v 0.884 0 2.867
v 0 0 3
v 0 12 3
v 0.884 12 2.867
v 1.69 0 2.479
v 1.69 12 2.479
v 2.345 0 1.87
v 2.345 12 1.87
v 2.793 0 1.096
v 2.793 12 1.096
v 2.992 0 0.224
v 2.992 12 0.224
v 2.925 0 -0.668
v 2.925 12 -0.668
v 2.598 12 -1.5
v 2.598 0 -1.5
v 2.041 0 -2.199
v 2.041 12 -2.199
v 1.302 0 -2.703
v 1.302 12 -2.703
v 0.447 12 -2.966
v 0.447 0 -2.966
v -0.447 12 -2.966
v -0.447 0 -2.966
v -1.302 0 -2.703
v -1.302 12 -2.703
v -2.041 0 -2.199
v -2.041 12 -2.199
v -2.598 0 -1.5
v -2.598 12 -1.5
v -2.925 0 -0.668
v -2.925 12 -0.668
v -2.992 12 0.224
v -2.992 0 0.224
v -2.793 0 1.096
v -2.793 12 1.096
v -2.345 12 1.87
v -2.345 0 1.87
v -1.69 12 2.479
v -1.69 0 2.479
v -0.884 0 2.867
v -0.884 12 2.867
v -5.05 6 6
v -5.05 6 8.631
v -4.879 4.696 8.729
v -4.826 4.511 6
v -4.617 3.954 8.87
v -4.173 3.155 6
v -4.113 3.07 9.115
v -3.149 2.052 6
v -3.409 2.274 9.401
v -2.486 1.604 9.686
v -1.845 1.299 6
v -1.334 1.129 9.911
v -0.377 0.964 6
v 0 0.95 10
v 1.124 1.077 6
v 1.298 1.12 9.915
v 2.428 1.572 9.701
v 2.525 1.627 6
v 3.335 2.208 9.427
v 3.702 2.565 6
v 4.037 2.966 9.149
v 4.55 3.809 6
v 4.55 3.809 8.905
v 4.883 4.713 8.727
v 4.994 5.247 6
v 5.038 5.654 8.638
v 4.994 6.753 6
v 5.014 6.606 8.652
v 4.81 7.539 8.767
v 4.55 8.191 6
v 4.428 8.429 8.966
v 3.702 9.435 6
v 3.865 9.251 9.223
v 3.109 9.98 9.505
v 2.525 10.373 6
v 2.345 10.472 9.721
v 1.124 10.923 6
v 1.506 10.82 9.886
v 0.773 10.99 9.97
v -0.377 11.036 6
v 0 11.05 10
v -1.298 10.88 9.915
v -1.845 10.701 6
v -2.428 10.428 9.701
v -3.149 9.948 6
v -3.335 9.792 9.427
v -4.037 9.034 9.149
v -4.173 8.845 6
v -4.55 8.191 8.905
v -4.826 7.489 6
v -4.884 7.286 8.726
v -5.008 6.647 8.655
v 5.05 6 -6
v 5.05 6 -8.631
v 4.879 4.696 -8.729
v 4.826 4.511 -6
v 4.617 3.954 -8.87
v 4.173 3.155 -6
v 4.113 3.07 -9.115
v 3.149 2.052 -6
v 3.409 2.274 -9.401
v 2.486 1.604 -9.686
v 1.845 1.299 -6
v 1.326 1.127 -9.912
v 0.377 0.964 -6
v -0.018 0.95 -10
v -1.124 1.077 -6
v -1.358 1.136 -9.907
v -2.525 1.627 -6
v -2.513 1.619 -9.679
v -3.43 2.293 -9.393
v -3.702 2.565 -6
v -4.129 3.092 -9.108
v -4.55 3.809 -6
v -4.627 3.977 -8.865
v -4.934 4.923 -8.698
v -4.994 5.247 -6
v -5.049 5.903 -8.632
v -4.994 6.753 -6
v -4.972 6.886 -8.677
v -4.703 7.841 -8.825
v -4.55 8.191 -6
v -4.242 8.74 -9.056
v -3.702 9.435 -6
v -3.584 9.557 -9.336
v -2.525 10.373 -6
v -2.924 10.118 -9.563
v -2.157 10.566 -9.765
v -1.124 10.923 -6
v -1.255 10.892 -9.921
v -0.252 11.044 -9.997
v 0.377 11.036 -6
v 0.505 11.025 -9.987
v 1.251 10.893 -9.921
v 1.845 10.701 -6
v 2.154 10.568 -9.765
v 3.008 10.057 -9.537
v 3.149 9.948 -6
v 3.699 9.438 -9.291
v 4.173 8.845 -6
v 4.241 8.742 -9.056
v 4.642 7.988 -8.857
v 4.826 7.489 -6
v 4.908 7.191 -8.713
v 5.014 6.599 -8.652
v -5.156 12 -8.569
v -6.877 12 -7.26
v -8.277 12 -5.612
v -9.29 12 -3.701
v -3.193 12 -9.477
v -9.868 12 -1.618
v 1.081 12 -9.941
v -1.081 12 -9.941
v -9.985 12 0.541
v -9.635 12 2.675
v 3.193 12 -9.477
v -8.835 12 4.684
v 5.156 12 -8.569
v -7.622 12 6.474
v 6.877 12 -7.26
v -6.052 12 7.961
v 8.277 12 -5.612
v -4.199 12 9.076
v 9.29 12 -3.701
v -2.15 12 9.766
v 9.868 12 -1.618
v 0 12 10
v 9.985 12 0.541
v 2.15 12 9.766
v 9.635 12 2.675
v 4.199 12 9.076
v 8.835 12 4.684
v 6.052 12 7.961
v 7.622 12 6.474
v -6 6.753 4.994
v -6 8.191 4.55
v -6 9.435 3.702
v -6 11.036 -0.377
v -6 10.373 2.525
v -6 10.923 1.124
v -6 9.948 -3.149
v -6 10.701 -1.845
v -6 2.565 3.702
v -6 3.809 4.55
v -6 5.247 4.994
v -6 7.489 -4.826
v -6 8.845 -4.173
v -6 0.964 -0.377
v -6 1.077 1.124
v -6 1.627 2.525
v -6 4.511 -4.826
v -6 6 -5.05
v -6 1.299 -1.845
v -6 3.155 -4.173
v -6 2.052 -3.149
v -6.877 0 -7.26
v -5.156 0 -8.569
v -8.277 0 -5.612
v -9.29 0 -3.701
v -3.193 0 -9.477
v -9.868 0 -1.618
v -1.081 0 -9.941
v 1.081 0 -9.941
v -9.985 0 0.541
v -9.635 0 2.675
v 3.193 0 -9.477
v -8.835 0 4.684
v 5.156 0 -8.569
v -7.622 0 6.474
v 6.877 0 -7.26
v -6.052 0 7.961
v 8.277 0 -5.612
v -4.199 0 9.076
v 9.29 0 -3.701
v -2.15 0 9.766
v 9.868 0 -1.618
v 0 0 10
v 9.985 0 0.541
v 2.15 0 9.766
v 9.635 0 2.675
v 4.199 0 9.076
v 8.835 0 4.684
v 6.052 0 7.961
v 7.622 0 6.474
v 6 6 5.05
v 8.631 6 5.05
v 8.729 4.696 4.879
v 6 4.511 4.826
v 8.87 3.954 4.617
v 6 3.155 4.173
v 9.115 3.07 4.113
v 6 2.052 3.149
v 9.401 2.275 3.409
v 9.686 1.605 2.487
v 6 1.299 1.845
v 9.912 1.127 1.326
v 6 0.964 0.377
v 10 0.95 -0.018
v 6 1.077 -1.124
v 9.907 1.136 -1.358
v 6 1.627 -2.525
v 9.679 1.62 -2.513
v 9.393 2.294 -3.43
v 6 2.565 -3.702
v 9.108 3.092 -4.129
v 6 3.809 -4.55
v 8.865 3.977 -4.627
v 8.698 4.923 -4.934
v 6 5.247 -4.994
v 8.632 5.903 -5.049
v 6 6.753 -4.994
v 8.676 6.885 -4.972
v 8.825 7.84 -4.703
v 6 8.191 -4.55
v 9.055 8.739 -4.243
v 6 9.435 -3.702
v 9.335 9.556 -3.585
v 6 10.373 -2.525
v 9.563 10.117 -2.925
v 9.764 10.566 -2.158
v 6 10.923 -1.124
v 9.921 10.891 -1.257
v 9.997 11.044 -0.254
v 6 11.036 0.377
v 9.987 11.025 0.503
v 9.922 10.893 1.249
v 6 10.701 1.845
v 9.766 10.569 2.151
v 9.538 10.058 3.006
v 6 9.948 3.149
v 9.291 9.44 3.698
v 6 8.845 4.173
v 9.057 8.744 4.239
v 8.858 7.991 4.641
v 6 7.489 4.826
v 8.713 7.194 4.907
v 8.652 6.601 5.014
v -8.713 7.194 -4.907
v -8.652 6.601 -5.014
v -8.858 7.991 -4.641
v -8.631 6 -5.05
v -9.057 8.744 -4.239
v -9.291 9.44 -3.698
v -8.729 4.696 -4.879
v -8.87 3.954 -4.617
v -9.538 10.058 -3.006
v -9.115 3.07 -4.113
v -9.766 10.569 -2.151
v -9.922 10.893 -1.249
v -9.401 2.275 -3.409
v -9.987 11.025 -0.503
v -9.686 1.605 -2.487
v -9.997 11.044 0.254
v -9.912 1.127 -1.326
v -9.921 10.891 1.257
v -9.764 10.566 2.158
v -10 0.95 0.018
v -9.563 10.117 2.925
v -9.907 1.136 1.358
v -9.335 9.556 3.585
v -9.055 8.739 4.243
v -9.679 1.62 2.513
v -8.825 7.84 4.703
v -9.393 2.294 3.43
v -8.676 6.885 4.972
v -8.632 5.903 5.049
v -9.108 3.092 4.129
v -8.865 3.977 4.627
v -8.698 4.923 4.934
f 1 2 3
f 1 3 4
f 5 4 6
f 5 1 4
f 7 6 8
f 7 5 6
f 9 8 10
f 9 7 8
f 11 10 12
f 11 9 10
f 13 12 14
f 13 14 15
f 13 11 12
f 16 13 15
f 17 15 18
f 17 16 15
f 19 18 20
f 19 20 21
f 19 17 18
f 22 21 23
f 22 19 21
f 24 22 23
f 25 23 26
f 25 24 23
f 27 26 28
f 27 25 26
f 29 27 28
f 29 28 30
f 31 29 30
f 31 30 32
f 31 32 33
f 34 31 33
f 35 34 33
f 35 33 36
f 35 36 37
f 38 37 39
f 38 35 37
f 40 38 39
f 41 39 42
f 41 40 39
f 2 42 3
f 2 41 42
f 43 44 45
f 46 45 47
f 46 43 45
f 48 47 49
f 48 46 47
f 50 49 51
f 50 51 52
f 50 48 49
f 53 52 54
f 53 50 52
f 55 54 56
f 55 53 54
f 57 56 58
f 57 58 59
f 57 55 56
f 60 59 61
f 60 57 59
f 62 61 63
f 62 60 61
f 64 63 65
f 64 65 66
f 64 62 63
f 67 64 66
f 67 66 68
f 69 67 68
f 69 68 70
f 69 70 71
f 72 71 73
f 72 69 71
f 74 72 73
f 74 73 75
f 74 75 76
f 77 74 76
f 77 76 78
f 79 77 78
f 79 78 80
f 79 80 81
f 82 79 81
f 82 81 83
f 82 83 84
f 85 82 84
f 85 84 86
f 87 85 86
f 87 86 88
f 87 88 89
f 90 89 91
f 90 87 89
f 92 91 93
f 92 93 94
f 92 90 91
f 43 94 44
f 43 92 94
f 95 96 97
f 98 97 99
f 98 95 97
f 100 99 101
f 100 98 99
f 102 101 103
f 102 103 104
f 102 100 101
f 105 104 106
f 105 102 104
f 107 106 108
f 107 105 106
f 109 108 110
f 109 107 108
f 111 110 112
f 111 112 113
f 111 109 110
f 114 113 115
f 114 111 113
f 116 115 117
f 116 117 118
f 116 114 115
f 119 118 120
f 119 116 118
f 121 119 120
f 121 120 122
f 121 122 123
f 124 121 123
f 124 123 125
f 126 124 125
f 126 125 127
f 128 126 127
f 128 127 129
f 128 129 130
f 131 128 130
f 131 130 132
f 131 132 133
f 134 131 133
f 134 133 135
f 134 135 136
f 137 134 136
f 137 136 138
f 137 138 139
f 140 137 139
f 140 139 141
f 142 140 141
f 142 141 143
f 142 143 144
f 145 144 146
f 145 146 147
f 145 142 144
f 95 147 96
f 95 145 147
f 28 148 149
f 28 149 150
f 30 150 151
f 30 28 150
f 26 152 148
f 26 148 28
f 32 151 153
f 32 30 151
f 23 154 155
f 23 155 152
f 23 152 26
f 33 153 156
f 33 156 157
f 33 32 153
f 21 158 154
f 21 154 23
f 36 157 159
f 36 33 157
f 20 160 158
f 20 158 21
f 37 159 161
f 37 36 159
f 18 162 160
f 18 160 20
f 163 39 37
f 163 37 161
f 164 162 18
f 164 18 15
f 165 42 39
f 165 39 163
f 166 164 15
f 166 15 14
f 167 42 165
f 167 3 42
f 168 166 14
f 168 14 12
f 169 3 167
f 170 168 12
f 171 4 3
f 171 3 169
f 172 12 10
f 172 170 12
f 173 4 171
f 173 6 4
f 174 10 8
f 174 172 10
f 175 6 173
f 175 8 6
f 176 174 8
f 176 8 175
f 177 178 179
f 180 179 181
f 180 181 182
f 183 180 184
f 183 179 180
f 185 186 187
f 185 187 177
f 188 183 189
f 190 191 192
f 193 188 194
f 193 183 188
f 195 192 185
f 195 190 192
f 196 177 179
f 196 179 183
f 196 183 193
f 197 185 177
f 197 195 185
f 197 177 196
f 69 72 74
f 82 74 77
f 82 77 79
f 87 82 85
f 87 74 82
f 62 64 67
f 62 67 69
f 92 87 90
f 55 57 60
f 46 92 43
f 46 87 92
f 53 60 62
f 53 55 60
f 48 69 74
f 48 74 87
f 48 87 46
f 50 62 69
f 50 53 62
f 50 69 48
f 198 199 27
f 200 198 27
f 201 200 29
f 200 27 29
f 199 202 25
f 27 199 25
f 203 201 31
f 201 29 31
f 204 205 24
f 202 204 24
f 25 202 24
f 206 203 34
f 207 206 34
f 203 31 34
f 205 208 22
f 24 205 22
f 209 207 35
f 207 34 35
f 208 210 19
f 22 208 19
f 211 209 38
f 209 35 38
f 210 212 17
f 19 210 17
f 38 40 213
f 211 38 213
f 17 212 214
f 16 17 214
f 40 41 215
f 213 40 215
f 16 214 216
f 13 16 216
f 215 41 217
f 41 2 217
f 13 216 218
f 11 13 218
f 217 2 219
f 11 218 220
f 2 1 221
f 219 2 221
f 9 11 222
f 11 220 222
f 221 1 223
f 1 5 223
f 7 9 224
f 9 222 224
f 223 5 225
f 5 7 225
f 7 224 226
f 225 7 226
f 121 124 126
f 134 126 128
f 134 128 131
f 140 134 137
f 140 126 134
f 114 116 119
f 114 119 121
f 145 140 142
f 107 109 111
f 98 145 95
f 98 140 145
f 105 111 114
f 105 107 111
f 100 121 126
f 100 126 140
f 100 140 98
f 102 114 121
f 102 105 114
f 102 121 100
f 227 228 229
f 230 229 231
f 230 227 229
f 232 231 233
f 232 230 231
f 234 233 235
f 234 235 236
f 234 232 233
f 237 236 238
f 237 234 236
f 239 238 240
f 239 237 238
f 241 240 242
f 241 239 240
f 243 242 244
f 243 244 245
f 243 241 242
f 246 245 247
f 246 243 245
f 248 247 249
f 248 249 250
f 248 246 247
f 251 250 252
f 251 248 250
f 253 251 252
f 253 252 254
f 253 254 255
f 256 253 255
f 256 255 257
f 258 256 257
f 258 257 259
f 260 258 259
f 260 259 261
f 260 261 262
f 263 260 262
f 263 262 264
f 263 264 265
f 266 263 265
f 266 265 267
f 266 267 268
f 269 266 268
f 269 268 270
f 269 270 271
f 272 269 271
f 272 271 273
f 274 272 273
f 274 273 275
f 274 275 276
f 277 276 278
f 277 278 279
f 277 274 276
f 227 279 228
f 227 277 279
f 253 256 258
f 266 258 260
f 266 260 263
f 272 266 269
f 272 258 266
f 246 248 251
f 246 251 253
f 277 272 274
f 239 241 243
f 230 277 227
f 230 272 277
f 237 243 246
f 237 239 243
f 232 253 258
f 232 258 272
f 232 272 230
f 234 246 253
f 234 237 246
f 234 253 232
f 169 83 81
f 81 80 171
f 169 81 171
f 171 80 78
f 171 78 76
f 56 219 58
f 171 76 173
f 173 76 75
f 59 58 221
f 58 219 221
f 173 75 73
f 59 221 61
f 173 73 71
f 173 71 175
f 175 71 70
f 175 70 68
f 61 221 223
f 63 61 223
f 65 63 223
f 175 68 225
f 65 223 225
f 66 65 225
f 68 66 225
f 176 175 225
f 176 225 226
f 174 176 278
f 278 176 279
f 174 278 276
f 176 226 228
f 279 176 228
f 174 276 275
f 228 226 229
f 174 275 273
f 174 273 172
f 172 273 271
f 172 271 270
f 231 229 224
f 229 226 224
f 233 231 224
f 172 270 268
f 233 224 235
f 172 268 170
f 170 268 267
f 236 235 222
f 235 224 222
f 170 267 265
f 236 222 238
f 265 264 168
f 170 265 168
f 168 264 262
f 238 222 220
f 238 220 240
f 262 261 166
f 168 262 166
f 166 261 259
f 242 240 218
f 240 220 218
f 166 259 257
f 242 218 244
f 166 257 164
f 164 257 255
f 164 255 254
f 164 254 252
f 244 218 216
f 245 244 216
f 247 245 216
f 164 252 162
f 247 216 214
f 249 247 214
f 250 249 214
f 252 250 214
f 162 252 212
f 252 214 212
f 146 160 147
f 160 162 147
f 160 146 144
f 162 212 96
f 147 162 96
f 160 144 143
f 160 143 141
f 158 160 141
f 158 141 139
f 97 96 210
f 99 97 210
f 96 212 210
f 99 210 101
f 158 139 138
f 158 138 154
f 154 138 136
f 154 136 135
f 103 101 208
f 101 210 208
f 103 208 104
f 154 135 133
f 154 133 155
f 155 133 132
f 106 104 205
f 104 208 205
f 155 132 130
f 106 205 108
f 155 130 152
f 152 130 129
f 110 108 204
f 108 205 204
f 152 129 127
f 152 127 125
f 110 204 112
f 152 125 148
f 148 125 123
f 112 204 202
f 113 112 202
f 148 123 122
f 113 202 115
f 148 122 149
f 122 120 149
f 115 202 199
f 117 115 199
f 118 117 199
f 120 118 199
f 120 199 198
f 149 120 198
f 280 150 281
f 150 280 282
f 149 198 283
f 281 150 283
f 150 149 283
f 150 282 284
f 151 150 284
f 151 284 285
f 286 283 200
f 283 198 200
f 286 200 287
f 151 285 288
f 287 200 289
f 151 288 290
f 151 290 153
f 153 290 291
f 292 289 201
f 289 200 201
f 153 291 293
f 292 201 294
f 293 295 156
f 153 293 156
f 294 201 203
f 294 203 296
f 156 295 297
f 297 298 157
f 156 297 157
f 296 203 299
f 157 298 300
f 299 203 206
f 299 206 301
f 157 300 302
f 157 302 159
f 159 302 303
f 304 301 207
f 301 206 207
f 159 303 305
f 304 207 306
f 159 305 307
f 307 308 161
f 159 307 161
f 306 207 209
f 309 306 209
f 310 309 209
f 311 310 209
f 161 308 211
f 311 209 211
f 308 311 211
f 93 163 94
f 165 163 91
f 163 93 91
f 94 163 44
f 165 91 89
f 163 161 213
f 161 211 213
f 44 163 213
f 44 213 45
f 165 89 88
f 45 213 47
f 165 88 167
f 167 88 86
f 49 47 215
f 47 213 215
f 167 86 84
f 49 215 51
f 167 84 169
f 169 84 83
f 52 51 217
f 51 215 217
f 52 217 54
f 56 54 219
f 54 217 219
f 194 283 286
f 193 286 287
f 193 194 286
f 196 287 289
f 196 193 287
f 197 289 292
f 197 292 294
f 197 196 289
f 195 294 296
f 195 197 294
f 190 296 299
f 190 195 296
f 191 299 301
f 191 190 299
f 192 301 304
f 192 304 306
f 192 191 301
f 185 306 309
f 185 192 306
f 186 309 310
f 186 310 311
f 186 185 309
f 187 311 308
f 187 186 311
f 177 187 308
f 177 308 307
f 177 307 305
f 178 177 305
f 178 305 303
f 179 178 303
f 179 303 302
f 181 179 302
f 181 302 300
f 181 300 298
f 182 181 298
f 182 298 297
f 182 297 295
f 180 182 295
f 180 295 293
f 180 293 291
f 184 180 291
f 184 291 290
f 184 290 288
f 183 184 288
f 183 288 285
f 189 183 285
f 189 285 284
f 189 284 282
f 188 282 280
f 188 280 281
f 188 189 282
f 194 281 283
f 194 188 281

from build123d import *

# Parameters (mm, degrees)
SKETCH_1_R               = 10
SKETCH_1_R_2             = 3
EXTRUDE_1_DEPTH          = 12
CUT_EXTRUDE_START        = 6
SKETCH_2_R               = 5.05
CUT_EXTRUDE_1_DEPTH      = 12
PATTERN_CIRCULAR_1_COUNT = 4


with BuildPart() as part:
    # 草图1 → 凸台-拉伸1 (new body)
    with BuildSketch(Plane(origin=(0, 0, 0), x_dir=(1, 0, 0), z_dir=(0, 1, 0))):
        with Locations(Location((0, 0, 0), (0, 0, 270))):
            Circle(SKETCH_1_R)
        with Locations(Location((0, 0, 0), (0, 0, 270))):
            Circle(SKETCH_1_R_2, mode=Mode.SUBTRACT)
    extrude(amount=EXTRUDE_1_DEPTH)

    # 草图2 → 切除-拉伸1 (cut)
    with BuildSketch(Plane.XY.offset(CUT_EXTRUDE_START)):
        with Locations(Location((0, 6, 0), (0, 0, 180))):
            Circle(SKETCH_2_R)
    cut_extrude_1 = extrude(amount=CUT_EXTRUDE_1_DEPTH, mode=Mode.SUBTRACT)

    # 阵列(圆周)1: 切除-拉伸1 ×4 about axis
    pattern_circular_1_axis = Axis((0, 0, 0), (0, 1, 0))
    for i in range(1, PATTERN_CIRCULAR_1_COUNT):
        add(cut_extrude_1.rotate(pattern_circular_1_axis, i * 360 / PATTERN_CIRCULAR_1_COUNT), mode=Mode.SUBTRACT)


solid = part.part
